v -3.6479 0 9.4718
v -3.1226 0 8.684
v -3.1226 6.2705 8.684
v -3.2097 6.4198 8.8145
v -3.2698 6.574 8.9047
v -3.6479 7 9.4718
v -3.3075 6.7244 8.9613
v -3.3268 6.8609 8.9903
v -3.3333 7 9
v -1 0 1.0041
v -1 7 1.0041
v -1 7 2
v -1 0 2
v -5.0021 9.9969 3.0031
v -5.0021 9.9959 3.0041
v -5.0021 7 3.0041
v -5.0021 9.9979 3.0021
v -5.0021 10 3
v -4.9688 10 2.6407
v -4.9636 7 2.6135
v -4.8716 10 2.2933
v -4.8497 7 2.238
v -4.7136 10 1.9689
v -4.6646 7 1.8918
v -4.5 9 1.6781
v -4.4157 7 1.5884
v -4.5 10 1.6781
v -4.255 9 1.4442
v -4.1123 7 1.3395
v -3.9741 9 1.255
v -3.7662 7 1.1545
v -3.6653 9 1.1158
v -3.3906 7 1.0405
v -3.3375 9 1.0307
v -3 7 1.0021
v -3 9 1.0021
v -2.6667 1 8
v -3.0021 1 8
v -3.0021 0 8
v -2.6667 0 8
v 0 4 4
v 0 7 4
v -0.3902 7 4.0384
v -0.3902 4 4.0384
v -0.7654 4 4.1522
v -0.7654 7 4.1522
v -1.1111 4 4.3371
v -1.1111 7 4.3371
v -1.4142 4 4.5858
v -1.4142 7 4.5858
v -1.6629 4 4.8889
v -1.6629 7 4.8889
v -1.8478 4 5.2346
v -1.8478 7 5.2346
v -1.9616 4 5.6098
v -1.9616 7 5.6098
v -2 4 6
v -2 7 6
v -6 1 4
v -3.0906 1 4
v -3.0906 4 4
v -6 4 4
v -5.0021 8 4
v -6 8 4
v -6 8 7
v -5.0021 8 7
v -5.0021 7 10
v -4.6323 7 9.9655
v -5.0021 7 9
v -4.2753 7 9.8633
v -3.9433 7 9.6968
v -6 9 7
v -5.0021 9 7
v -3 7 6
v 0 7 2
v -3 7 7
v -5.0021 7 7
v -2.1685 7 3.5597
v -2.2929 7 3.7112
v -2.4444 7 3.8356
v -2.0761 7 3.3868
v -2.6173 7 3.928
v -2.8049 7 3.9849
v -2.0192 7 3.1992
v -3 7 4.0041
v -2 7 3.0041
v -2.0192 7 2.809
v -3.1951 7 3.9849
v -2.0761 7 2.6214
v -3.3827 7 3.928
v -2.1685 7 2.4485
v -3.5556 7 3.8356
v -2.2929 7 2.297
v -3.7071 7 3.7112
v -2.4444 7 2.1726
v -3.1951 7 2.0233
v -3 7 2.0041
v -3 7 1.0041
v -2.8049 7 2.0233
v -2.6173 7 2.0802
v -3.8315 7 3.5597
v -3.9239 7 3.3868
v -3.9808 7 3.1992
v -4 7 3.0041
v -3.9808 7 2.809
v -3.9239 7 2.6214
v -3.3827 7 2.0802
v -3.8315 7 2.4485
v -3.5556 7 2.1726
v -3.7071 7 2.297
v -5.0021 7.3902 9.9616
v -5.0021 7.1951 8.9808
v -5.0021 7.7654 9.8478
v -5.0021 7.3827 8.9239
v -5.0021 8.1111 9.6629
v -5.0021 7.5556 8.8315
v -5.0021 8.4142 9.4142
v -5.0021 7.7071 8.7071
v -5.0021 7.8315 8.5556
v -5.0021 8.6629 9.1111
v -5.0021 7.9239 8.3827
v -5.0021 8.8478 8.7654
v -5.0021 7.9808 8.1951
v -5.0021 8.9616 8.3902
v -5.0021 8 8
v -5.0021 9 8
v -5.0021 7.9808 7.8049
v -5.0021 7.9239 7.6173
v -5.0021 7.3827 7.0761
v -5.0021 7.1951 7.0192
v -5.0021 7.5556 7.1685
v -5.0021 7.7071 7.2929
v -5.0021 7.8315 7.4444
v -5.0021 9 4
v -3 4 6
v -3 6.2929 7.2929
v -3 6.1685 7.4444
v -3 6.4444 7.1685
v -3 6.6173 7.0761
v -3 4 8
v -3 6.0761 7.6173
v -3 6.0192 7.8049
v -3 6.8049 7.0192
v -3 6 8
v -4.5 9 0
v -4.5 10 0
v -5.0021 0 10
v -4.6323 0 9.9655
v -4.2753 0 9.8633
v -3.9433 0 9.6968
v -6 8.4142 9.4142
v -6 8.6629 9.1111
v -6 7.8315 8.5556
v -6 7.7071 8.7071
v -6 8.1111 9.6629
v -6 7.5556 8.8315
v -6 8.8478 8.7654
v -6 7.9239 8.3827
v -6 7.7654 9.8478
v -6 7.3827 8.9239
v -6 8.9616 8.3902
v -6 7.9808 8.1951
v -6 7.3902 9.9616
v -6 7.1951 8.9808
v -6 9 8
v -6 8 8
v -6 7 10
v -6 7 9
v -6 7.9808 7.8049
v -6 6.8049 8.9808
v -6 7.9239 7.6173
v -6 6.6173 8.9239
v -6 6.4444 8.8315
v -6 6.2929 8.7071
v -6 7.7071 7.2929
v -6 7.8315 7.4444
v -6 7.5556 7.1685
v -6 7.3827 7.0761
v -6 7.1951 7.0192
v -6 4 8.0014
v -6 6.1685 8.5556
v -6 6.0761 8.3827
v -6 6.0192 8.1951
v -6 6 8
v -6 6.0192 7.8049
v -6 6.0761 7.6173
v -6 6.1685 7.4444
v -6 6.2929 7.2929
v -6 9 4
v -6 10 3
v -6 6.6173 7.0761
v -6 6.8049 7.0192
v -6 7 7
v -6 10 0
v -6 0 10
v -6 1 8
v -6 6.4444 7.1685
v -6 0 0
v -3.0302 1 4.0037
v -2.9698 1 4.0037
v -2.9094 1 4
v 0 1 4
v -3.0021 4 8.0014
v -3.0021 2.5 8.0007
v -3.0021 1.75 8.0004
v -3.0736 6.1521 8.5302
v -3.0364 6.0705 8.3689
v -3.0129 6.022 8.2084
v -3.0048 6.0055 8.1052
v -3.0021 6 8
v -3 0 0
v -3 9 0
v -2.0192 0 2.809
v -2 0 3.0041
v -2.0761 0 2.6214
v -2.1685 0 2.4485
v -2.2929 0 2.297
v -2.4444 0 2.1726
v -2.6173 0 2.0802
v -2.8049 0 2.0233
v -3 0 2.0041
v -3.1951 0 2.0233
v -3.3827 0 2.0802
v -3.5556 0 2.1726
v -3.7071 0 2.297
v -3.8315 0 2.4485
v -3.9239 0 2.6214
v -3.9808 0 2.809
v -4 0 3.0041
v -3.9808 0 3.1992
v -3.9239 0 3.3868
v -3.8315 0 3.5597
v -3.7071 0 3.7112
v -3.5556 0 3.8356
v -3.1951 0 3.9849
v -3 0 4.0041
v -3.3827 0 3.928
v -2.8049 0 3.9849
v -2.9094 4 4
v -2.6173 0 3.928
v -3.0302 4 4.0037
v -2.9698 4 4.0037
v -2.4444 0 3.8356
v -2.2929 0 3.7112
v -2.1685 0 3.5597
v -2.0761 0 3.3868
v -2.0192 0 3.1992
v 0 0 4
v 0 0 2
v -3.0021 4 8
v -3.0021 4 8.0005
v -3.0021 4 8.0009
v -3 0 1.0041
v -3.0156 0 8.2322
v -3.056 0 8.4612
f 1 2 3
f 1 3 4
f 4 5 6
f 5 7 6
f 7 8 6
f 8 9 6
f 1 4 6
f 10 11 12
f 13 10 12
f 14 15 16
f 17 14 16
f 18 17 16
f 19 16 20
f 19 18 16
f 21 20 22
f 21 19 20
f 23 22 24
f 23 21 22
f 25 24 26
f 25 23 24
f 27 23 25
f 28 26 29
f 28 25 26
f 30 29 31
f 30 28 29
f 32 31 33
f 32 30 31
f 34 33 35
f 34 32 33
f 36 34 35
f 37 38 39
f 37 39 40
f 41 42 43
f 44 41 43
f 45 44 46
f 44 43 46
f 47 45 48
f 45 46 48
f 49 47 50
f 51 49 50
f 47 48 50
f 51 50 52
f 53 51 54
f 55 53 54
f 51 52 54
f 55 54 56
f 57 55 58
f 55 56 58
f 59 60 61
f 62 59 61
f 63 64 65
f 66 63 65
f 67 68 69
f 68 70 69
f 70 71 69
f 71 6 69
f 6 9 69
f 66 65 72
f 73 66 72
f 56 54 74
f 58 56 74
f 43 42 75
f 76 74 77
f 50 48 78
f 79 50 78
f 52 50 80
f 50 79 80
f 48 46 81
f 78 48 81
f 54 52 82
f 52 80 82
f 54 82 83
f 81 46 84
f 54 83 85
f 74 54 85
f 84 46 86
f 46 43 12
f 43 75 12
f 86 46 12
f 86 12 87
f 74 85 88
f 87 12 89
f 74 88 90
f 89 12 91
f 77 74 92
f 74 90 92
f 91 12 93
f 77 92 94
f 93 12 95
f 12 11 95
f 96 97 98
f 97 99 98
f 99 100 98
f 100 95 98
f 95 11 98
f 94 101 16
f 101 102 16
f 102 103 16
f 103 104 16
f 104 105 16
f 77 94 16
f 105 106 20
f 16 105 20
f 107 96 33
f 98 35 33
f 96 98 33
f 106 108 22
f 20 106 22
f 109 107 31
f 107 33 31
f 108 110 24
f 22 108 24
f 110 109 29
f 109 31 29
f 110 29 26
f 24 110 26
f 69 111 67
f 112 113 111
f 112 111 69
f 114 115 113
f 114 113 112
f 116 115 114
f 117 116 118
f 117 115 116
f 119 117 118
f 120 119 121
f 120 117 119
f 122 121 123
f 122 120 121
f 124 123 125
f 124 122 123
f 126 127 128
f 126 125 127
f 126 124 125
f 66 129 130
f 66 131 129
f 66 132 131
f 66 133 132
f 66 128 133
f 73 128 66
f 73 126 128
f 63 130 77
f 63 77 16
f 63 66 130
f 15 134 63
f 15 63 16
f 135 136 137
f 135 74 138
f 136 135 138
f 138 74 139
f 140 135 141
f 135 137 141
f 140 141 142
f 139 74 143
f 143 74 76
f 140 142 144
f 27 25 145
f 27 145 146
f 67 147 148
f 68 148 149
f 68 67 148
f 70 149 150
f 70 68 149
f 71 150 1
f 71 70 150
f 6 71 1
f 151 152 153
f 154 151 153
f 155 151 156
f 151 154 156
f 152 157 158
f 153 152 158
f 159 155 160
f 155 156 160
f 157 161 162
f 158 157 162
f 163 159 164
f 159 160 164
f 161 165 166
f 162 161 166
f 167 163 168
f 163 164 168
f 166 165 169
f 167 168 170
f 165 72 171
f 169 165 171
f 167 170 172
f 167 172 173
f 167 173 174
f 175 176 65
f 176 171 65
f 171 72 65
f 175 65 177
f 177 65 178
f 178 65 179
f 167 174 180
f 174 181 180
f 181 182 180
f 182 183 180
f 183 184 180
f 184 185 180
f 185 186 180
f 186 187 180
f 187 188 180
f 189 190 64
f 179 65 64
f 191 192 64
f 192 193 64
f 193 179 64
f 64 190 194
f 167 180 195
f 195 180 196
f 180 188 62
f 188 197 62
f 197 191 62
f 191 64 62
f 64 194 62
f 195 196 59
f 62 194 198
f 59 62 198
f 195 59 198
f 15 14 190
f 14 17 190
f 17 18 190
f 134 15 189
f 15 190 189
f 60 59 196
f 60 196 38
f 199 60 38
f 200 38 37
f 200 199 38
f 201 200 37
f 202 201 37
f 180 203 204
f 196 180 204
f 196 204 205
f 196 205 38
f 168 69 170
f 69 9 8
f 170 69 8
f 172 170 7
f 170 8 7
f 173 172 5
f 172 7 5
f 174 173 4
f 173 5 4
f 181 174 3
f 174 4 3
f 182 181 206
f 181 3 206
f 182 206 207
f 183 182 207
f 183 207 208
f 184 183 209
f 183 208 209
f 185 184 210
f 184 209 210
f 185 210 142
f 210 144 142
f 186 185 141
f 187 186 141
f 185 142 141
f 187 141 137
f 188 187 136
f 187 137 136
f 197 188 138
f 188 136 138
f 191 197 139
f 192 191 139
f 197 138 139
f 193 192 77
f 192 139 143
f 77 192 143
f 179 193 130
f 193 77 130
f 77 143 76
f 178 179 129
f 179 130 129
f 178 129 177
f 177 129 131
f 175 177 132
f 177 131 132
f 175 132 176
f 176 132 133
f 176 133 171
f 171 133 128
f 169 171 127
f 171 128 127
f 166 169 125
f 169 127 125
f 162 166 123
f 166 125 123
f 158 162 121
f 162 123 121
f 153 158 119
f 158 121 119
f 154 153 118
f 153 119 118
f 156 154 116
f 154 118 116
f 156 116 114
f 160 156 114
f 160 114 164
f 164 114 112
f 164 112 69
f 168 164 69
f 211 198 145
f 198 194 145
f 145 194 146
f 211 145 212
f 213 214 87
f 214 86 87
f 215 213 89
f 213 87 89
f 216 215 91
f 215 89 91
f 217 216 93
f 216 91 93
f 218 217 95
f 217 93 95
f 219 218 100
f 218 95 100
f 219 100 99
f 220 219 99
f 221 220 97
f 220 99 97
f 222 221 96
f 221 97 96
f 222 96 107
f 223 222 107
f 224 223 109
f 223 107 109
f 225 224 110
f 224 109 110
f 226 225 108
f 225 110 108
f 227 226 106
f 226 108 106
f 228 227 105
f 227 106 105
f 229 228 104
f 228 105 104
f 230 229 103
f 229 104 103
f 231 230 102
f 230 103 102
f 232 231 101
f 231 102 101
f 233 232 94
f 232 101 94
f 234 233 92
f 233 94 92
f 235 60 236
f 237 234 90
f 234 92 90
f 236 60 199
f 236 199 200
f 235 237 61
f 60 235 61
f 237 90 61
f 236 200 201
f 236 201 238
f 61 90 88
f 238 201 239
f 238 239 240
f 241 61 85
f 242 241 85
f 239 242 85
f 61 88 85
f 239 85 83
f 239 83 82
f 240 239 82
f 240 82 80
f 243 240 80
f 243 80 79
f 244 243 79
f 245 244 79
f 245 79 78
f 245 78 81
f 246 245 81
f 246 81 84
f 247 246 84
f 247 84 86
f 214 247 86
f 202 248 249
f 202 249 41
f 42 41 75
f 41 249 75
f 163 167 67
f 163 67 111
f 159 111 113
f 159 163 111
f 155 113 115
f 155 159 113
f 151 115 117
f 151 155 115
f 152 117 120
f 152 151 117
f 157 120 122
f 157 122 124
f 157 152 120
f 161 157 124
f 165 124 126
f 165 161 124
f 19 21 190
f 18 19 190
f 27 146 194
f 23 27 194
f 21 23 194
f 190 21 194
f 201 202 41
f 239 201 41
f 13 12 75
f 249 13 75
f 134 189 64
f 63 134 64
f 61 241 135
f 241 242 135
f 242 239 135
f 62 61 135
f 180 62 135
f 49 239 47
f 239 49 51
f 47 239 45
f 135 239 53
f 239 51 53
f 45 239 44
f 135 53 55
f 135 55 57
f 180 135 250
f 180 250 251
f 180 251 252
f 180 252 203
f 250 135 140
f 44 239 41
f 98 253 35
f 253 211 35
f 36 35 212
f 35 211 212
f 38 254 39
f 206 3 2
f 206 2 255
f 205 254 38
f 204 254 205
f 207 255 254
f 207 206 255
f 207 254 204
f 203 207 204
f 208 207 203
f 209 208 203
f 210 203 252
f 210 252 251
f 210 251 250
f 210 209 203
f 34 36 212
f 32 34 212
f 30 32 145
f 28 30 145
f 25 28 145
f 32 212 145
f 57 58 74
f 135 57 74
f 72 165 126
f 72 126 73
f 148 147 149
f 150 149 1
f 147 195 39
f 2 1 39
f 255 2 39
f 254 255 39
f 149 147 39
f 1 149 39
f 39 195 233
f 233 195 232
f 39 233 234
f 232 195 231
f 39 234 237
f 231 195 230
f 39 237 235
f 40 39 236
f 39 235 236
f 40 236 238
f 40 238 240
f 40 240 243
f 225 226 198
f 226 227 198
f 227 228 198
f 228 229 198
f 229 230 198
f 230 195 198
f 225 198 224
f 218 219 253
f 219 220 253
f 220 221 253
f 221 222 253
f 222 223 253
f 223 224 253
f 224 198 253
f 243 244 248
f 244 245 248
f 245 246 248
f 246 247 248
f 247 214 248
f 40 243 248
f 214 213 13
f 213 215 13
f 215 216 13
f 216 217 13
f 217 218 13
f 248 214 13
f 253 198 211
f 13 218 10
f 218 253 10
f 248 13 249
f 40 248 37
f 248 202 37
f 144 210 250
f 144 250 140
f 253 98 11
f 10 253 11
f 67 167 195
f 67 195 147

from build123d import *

# Parameters (mm, degrees)
BOSS_EXTRUDE1_DEPTH = 10
CUT_EXTRUDE3_DEPTH  = 8
SKETCH5_R           = 1
CUT_EXTRUDE5_DEPTH  = 7.5
CUT_EXTRUDE7_DEPTH  = 2
CUT_EXTRUDE10_DEPTH = 4
CUT_EXTRUDE12_DEPTH = 7
CUT_EXTRUDE14_DEPTH = 6
CUT_EXTRUDE15_DEPTH = 7
SKETCH18_W          = 1.999299567
SKETCH18_H          = 4.5
CUT_EXTRUDE29_DEPTH = 2
CUT_EXTRUDE30_DEPTH = 2
CUT_EXTRUDE31_DEPTH = 7
CUT_EXTRUDE33_DEPTH = 10


with BuildPart() as part:
    # Sketch1 → Boss-Extrude1 (new body)
    with BuildSketch(Plane.XY):
        Polygon((0, 0), (0, 7), (-3, 7), (-3, 9), (-4.5, 9), (-4.5, 10), (-6, 10), (-6, 0), align=None)
    extrude(amount=BOSS_EXTRUDE1_DEPTH)

    # Sketch3 → Cut-Extrude3 (cut, through all)
    with BuildSketch(Plane(origin=(0, 7, 0), x_dir=(1, 0, 0), z_dir=(0, 1, 0))):
        Polygon((-3, 0), (-3, -1.004111064), (-1, -1.004111064), (-1, -2), (0, -2), (0, 0), align=None)
    extrude(amount=-CUT_EXTRUDE3_DEPTH, mode=Mode.SUBTRACT)

    # Sketch5 → Cut-Extrude5 (cut, symmetric)
    with BuildSketch(Plane(origin=(0, 7, 0), x_dir=(1, 0, 0), z_dir=(0, 1, 0))):
        with Locations((-3, -3.004111064)):
            Circle(SKETCH5_R)
    extrude(amount=CUT_EXTRUDE5_DEPTH, both=True, mode=Mode.SUBTRACT)

    # Sketch7 → Cut-Extrude7 (cut, symmetric)
    with BuildSketch(Plane(origin=(0, 9, 0), x_dir=(1, 0, 0), z_dir=(0, 1, 0))):
        with BuildLine():
            Line((-3, -1.002055532), (-3, -2.004111064))
            ThreePointArc((-3, -2.004111064), (-4, -3.004111064), (-3, -4.004111064))
            Line((-3, -4.004111064), (-3, -10))
            Line((-3, -10), (-5.002055532, -10))
            Line((-5.002055532, -10), (-5.002055532, -3.004111064))
            ThreePointArc((-5.002055532, -3.004111064), (-4.415667043, -1.588444021), (-3, -1.002055532))
        make_face()
    extrude(amount=CUT_EXTRUDE7_DEPTH, both=True, mode=Mode.SUBTRACT)

    # Sketch8 → Cut-Extrude10 (cut)
    with BuildSketch(Plane.ZY.offset(6)):
        Polygon((3, 10), (4, 9), (4, 8), (7, 8), (7, 10), align=None)
    extrude(amount=-CUT_EXTRUDE10_DEPTH, mode=Mode.SUBTRACT)

    # Sketch9 → Cut-Extrude12 (cut, symmetric)
    with BuildSketch(Plane(origin=(-5.002055532, 0, 0), x_dir=(0, 0, -1), z_dir=(1, 0, 0))):
        with BuildLine():
            Line((-8, 9), (-7, 9))
            Line((-7, 9), (-7, 10))
            Line((-7, 10), (-10, 10))
            Line((-10, 10), (-10, 7))
            ThreePointArc((-10, 7), (-9.414213562, 8.414213562), (-8, 9))
        make_face()
        with BuildLine():
            ThreePointArc((-7, 7), (-8, 8), (-9, 7))
            Line((-9, 7), (-7, 7))
        make_face()
        with BuildLine():
            Line((-7, 7), (-9, 7))
            ThreePointArc((-9, 7), (-8, 6), (-7, 7))
        make_face()
    extrude(amount=CUT_EXTRUDE12_DEPTH, both=True, mode=Mode.SUBTRACT)

    # Sketch10 → Cut-Extrude14 (cut)
    with BuildSketch(Plane(origin=(0, 7, 0), x_dir=(1, 0, 0), z_dir=(0, 1, 0))):
        with BuildLine():
            Line((-2, -6), (-3, -6))
            Line((-3, -6), (-3, -8.001400867))
            Line((-3, -8.001400867), (0, -8))
            Line((0, -8), (0, -4))
            ThreePointArc((0, -4), (-1.414213562, -4.585786438), (-2, -6))
        make_face()
    extrude(amount=-CUT_EXTRUDE14_DEPTH, mode=Mode.SUBTRACT)

    # Sketch12 → Cut-Extrude15 (cut, through all)
    with BuildSketch(Plane(origin=(0, 0, 0), x_dir=(0, 0, -1), z_dir=(1, 0, 0))):
        Polygon((-4, 1), (-4, 4), (-8.001400867, 4), (-8, 1), align=None)
    extrude(amount=-CUT_EXTRUDE15_DEPTH, mode=Mode.SUBTRACT)

    # Sketch18 → Cut-Extrude29 (cut)
    with BuildSketch(Plane(origin=(0, 0, 0), x_dir=(0, 0, -1), z_dir=(1, 0, 0))):
        with Locations((-9.000350216, 4.75)):
            Rectangle(SKETCH18_W, SKETCH18_H)
    extrude(amount=-CUT_EXTRUDE29_DEPTH, mode=Mode.SUBTRACT)

    # Sketch21 → Cut-Extrude30 (cut)
    with BuildSketch(Plane.XY.offset(8.000700433)):
        Polygon((0, 6.000000245), (-1.5, 6.000000981), (-1.5, 4), (0, 4), align=None)
    extrude(amount=-CUT_EXTRUDE30_DEPTH, mode=Mode.SUBTRACT)

    # Sketch22 → Cut-Extrude31 (cut)
    with BuildSketch(Plane(origin=(0, 7, 0), x_dir=(1, 0, 0), z_dir=(0, 1, 0))):
        Polygon((0, -4), (-4, -10), (0, -10), align=None)
    extrude(amount=-CUT_EXTRUDE31_DEPTH, mode=Mode.SUBTRACT)

    # Sketch23 → Cut-Extrude33 (cut)
    with BuildSketch(Plane(origin=(0, 7, 0), x_dir=(1, 0, 0), z_dir=(0, 1, 0))):
        with BuildLine():
            Line((-3.002055532, -8), (-0.668346428, -8))
            Line((-0.668346428, -8), (-0.668346428, -10.987104512))
            Line((-0.668346428, -10.987104512), (-5.156575053, -10.987104512))
            Line((-5.156575053, -10.987104512), (-5.002055532, -10))
            ThreePointArc((-5.002055532, -10), (-3.587841969, -9.414213562), (-3.002055532, -8))
        make_face()
    extrude(amount=-CUT_EXTRUDE33_DEPTH, mode=Mode.SUBTRACT)


solid = part.part
